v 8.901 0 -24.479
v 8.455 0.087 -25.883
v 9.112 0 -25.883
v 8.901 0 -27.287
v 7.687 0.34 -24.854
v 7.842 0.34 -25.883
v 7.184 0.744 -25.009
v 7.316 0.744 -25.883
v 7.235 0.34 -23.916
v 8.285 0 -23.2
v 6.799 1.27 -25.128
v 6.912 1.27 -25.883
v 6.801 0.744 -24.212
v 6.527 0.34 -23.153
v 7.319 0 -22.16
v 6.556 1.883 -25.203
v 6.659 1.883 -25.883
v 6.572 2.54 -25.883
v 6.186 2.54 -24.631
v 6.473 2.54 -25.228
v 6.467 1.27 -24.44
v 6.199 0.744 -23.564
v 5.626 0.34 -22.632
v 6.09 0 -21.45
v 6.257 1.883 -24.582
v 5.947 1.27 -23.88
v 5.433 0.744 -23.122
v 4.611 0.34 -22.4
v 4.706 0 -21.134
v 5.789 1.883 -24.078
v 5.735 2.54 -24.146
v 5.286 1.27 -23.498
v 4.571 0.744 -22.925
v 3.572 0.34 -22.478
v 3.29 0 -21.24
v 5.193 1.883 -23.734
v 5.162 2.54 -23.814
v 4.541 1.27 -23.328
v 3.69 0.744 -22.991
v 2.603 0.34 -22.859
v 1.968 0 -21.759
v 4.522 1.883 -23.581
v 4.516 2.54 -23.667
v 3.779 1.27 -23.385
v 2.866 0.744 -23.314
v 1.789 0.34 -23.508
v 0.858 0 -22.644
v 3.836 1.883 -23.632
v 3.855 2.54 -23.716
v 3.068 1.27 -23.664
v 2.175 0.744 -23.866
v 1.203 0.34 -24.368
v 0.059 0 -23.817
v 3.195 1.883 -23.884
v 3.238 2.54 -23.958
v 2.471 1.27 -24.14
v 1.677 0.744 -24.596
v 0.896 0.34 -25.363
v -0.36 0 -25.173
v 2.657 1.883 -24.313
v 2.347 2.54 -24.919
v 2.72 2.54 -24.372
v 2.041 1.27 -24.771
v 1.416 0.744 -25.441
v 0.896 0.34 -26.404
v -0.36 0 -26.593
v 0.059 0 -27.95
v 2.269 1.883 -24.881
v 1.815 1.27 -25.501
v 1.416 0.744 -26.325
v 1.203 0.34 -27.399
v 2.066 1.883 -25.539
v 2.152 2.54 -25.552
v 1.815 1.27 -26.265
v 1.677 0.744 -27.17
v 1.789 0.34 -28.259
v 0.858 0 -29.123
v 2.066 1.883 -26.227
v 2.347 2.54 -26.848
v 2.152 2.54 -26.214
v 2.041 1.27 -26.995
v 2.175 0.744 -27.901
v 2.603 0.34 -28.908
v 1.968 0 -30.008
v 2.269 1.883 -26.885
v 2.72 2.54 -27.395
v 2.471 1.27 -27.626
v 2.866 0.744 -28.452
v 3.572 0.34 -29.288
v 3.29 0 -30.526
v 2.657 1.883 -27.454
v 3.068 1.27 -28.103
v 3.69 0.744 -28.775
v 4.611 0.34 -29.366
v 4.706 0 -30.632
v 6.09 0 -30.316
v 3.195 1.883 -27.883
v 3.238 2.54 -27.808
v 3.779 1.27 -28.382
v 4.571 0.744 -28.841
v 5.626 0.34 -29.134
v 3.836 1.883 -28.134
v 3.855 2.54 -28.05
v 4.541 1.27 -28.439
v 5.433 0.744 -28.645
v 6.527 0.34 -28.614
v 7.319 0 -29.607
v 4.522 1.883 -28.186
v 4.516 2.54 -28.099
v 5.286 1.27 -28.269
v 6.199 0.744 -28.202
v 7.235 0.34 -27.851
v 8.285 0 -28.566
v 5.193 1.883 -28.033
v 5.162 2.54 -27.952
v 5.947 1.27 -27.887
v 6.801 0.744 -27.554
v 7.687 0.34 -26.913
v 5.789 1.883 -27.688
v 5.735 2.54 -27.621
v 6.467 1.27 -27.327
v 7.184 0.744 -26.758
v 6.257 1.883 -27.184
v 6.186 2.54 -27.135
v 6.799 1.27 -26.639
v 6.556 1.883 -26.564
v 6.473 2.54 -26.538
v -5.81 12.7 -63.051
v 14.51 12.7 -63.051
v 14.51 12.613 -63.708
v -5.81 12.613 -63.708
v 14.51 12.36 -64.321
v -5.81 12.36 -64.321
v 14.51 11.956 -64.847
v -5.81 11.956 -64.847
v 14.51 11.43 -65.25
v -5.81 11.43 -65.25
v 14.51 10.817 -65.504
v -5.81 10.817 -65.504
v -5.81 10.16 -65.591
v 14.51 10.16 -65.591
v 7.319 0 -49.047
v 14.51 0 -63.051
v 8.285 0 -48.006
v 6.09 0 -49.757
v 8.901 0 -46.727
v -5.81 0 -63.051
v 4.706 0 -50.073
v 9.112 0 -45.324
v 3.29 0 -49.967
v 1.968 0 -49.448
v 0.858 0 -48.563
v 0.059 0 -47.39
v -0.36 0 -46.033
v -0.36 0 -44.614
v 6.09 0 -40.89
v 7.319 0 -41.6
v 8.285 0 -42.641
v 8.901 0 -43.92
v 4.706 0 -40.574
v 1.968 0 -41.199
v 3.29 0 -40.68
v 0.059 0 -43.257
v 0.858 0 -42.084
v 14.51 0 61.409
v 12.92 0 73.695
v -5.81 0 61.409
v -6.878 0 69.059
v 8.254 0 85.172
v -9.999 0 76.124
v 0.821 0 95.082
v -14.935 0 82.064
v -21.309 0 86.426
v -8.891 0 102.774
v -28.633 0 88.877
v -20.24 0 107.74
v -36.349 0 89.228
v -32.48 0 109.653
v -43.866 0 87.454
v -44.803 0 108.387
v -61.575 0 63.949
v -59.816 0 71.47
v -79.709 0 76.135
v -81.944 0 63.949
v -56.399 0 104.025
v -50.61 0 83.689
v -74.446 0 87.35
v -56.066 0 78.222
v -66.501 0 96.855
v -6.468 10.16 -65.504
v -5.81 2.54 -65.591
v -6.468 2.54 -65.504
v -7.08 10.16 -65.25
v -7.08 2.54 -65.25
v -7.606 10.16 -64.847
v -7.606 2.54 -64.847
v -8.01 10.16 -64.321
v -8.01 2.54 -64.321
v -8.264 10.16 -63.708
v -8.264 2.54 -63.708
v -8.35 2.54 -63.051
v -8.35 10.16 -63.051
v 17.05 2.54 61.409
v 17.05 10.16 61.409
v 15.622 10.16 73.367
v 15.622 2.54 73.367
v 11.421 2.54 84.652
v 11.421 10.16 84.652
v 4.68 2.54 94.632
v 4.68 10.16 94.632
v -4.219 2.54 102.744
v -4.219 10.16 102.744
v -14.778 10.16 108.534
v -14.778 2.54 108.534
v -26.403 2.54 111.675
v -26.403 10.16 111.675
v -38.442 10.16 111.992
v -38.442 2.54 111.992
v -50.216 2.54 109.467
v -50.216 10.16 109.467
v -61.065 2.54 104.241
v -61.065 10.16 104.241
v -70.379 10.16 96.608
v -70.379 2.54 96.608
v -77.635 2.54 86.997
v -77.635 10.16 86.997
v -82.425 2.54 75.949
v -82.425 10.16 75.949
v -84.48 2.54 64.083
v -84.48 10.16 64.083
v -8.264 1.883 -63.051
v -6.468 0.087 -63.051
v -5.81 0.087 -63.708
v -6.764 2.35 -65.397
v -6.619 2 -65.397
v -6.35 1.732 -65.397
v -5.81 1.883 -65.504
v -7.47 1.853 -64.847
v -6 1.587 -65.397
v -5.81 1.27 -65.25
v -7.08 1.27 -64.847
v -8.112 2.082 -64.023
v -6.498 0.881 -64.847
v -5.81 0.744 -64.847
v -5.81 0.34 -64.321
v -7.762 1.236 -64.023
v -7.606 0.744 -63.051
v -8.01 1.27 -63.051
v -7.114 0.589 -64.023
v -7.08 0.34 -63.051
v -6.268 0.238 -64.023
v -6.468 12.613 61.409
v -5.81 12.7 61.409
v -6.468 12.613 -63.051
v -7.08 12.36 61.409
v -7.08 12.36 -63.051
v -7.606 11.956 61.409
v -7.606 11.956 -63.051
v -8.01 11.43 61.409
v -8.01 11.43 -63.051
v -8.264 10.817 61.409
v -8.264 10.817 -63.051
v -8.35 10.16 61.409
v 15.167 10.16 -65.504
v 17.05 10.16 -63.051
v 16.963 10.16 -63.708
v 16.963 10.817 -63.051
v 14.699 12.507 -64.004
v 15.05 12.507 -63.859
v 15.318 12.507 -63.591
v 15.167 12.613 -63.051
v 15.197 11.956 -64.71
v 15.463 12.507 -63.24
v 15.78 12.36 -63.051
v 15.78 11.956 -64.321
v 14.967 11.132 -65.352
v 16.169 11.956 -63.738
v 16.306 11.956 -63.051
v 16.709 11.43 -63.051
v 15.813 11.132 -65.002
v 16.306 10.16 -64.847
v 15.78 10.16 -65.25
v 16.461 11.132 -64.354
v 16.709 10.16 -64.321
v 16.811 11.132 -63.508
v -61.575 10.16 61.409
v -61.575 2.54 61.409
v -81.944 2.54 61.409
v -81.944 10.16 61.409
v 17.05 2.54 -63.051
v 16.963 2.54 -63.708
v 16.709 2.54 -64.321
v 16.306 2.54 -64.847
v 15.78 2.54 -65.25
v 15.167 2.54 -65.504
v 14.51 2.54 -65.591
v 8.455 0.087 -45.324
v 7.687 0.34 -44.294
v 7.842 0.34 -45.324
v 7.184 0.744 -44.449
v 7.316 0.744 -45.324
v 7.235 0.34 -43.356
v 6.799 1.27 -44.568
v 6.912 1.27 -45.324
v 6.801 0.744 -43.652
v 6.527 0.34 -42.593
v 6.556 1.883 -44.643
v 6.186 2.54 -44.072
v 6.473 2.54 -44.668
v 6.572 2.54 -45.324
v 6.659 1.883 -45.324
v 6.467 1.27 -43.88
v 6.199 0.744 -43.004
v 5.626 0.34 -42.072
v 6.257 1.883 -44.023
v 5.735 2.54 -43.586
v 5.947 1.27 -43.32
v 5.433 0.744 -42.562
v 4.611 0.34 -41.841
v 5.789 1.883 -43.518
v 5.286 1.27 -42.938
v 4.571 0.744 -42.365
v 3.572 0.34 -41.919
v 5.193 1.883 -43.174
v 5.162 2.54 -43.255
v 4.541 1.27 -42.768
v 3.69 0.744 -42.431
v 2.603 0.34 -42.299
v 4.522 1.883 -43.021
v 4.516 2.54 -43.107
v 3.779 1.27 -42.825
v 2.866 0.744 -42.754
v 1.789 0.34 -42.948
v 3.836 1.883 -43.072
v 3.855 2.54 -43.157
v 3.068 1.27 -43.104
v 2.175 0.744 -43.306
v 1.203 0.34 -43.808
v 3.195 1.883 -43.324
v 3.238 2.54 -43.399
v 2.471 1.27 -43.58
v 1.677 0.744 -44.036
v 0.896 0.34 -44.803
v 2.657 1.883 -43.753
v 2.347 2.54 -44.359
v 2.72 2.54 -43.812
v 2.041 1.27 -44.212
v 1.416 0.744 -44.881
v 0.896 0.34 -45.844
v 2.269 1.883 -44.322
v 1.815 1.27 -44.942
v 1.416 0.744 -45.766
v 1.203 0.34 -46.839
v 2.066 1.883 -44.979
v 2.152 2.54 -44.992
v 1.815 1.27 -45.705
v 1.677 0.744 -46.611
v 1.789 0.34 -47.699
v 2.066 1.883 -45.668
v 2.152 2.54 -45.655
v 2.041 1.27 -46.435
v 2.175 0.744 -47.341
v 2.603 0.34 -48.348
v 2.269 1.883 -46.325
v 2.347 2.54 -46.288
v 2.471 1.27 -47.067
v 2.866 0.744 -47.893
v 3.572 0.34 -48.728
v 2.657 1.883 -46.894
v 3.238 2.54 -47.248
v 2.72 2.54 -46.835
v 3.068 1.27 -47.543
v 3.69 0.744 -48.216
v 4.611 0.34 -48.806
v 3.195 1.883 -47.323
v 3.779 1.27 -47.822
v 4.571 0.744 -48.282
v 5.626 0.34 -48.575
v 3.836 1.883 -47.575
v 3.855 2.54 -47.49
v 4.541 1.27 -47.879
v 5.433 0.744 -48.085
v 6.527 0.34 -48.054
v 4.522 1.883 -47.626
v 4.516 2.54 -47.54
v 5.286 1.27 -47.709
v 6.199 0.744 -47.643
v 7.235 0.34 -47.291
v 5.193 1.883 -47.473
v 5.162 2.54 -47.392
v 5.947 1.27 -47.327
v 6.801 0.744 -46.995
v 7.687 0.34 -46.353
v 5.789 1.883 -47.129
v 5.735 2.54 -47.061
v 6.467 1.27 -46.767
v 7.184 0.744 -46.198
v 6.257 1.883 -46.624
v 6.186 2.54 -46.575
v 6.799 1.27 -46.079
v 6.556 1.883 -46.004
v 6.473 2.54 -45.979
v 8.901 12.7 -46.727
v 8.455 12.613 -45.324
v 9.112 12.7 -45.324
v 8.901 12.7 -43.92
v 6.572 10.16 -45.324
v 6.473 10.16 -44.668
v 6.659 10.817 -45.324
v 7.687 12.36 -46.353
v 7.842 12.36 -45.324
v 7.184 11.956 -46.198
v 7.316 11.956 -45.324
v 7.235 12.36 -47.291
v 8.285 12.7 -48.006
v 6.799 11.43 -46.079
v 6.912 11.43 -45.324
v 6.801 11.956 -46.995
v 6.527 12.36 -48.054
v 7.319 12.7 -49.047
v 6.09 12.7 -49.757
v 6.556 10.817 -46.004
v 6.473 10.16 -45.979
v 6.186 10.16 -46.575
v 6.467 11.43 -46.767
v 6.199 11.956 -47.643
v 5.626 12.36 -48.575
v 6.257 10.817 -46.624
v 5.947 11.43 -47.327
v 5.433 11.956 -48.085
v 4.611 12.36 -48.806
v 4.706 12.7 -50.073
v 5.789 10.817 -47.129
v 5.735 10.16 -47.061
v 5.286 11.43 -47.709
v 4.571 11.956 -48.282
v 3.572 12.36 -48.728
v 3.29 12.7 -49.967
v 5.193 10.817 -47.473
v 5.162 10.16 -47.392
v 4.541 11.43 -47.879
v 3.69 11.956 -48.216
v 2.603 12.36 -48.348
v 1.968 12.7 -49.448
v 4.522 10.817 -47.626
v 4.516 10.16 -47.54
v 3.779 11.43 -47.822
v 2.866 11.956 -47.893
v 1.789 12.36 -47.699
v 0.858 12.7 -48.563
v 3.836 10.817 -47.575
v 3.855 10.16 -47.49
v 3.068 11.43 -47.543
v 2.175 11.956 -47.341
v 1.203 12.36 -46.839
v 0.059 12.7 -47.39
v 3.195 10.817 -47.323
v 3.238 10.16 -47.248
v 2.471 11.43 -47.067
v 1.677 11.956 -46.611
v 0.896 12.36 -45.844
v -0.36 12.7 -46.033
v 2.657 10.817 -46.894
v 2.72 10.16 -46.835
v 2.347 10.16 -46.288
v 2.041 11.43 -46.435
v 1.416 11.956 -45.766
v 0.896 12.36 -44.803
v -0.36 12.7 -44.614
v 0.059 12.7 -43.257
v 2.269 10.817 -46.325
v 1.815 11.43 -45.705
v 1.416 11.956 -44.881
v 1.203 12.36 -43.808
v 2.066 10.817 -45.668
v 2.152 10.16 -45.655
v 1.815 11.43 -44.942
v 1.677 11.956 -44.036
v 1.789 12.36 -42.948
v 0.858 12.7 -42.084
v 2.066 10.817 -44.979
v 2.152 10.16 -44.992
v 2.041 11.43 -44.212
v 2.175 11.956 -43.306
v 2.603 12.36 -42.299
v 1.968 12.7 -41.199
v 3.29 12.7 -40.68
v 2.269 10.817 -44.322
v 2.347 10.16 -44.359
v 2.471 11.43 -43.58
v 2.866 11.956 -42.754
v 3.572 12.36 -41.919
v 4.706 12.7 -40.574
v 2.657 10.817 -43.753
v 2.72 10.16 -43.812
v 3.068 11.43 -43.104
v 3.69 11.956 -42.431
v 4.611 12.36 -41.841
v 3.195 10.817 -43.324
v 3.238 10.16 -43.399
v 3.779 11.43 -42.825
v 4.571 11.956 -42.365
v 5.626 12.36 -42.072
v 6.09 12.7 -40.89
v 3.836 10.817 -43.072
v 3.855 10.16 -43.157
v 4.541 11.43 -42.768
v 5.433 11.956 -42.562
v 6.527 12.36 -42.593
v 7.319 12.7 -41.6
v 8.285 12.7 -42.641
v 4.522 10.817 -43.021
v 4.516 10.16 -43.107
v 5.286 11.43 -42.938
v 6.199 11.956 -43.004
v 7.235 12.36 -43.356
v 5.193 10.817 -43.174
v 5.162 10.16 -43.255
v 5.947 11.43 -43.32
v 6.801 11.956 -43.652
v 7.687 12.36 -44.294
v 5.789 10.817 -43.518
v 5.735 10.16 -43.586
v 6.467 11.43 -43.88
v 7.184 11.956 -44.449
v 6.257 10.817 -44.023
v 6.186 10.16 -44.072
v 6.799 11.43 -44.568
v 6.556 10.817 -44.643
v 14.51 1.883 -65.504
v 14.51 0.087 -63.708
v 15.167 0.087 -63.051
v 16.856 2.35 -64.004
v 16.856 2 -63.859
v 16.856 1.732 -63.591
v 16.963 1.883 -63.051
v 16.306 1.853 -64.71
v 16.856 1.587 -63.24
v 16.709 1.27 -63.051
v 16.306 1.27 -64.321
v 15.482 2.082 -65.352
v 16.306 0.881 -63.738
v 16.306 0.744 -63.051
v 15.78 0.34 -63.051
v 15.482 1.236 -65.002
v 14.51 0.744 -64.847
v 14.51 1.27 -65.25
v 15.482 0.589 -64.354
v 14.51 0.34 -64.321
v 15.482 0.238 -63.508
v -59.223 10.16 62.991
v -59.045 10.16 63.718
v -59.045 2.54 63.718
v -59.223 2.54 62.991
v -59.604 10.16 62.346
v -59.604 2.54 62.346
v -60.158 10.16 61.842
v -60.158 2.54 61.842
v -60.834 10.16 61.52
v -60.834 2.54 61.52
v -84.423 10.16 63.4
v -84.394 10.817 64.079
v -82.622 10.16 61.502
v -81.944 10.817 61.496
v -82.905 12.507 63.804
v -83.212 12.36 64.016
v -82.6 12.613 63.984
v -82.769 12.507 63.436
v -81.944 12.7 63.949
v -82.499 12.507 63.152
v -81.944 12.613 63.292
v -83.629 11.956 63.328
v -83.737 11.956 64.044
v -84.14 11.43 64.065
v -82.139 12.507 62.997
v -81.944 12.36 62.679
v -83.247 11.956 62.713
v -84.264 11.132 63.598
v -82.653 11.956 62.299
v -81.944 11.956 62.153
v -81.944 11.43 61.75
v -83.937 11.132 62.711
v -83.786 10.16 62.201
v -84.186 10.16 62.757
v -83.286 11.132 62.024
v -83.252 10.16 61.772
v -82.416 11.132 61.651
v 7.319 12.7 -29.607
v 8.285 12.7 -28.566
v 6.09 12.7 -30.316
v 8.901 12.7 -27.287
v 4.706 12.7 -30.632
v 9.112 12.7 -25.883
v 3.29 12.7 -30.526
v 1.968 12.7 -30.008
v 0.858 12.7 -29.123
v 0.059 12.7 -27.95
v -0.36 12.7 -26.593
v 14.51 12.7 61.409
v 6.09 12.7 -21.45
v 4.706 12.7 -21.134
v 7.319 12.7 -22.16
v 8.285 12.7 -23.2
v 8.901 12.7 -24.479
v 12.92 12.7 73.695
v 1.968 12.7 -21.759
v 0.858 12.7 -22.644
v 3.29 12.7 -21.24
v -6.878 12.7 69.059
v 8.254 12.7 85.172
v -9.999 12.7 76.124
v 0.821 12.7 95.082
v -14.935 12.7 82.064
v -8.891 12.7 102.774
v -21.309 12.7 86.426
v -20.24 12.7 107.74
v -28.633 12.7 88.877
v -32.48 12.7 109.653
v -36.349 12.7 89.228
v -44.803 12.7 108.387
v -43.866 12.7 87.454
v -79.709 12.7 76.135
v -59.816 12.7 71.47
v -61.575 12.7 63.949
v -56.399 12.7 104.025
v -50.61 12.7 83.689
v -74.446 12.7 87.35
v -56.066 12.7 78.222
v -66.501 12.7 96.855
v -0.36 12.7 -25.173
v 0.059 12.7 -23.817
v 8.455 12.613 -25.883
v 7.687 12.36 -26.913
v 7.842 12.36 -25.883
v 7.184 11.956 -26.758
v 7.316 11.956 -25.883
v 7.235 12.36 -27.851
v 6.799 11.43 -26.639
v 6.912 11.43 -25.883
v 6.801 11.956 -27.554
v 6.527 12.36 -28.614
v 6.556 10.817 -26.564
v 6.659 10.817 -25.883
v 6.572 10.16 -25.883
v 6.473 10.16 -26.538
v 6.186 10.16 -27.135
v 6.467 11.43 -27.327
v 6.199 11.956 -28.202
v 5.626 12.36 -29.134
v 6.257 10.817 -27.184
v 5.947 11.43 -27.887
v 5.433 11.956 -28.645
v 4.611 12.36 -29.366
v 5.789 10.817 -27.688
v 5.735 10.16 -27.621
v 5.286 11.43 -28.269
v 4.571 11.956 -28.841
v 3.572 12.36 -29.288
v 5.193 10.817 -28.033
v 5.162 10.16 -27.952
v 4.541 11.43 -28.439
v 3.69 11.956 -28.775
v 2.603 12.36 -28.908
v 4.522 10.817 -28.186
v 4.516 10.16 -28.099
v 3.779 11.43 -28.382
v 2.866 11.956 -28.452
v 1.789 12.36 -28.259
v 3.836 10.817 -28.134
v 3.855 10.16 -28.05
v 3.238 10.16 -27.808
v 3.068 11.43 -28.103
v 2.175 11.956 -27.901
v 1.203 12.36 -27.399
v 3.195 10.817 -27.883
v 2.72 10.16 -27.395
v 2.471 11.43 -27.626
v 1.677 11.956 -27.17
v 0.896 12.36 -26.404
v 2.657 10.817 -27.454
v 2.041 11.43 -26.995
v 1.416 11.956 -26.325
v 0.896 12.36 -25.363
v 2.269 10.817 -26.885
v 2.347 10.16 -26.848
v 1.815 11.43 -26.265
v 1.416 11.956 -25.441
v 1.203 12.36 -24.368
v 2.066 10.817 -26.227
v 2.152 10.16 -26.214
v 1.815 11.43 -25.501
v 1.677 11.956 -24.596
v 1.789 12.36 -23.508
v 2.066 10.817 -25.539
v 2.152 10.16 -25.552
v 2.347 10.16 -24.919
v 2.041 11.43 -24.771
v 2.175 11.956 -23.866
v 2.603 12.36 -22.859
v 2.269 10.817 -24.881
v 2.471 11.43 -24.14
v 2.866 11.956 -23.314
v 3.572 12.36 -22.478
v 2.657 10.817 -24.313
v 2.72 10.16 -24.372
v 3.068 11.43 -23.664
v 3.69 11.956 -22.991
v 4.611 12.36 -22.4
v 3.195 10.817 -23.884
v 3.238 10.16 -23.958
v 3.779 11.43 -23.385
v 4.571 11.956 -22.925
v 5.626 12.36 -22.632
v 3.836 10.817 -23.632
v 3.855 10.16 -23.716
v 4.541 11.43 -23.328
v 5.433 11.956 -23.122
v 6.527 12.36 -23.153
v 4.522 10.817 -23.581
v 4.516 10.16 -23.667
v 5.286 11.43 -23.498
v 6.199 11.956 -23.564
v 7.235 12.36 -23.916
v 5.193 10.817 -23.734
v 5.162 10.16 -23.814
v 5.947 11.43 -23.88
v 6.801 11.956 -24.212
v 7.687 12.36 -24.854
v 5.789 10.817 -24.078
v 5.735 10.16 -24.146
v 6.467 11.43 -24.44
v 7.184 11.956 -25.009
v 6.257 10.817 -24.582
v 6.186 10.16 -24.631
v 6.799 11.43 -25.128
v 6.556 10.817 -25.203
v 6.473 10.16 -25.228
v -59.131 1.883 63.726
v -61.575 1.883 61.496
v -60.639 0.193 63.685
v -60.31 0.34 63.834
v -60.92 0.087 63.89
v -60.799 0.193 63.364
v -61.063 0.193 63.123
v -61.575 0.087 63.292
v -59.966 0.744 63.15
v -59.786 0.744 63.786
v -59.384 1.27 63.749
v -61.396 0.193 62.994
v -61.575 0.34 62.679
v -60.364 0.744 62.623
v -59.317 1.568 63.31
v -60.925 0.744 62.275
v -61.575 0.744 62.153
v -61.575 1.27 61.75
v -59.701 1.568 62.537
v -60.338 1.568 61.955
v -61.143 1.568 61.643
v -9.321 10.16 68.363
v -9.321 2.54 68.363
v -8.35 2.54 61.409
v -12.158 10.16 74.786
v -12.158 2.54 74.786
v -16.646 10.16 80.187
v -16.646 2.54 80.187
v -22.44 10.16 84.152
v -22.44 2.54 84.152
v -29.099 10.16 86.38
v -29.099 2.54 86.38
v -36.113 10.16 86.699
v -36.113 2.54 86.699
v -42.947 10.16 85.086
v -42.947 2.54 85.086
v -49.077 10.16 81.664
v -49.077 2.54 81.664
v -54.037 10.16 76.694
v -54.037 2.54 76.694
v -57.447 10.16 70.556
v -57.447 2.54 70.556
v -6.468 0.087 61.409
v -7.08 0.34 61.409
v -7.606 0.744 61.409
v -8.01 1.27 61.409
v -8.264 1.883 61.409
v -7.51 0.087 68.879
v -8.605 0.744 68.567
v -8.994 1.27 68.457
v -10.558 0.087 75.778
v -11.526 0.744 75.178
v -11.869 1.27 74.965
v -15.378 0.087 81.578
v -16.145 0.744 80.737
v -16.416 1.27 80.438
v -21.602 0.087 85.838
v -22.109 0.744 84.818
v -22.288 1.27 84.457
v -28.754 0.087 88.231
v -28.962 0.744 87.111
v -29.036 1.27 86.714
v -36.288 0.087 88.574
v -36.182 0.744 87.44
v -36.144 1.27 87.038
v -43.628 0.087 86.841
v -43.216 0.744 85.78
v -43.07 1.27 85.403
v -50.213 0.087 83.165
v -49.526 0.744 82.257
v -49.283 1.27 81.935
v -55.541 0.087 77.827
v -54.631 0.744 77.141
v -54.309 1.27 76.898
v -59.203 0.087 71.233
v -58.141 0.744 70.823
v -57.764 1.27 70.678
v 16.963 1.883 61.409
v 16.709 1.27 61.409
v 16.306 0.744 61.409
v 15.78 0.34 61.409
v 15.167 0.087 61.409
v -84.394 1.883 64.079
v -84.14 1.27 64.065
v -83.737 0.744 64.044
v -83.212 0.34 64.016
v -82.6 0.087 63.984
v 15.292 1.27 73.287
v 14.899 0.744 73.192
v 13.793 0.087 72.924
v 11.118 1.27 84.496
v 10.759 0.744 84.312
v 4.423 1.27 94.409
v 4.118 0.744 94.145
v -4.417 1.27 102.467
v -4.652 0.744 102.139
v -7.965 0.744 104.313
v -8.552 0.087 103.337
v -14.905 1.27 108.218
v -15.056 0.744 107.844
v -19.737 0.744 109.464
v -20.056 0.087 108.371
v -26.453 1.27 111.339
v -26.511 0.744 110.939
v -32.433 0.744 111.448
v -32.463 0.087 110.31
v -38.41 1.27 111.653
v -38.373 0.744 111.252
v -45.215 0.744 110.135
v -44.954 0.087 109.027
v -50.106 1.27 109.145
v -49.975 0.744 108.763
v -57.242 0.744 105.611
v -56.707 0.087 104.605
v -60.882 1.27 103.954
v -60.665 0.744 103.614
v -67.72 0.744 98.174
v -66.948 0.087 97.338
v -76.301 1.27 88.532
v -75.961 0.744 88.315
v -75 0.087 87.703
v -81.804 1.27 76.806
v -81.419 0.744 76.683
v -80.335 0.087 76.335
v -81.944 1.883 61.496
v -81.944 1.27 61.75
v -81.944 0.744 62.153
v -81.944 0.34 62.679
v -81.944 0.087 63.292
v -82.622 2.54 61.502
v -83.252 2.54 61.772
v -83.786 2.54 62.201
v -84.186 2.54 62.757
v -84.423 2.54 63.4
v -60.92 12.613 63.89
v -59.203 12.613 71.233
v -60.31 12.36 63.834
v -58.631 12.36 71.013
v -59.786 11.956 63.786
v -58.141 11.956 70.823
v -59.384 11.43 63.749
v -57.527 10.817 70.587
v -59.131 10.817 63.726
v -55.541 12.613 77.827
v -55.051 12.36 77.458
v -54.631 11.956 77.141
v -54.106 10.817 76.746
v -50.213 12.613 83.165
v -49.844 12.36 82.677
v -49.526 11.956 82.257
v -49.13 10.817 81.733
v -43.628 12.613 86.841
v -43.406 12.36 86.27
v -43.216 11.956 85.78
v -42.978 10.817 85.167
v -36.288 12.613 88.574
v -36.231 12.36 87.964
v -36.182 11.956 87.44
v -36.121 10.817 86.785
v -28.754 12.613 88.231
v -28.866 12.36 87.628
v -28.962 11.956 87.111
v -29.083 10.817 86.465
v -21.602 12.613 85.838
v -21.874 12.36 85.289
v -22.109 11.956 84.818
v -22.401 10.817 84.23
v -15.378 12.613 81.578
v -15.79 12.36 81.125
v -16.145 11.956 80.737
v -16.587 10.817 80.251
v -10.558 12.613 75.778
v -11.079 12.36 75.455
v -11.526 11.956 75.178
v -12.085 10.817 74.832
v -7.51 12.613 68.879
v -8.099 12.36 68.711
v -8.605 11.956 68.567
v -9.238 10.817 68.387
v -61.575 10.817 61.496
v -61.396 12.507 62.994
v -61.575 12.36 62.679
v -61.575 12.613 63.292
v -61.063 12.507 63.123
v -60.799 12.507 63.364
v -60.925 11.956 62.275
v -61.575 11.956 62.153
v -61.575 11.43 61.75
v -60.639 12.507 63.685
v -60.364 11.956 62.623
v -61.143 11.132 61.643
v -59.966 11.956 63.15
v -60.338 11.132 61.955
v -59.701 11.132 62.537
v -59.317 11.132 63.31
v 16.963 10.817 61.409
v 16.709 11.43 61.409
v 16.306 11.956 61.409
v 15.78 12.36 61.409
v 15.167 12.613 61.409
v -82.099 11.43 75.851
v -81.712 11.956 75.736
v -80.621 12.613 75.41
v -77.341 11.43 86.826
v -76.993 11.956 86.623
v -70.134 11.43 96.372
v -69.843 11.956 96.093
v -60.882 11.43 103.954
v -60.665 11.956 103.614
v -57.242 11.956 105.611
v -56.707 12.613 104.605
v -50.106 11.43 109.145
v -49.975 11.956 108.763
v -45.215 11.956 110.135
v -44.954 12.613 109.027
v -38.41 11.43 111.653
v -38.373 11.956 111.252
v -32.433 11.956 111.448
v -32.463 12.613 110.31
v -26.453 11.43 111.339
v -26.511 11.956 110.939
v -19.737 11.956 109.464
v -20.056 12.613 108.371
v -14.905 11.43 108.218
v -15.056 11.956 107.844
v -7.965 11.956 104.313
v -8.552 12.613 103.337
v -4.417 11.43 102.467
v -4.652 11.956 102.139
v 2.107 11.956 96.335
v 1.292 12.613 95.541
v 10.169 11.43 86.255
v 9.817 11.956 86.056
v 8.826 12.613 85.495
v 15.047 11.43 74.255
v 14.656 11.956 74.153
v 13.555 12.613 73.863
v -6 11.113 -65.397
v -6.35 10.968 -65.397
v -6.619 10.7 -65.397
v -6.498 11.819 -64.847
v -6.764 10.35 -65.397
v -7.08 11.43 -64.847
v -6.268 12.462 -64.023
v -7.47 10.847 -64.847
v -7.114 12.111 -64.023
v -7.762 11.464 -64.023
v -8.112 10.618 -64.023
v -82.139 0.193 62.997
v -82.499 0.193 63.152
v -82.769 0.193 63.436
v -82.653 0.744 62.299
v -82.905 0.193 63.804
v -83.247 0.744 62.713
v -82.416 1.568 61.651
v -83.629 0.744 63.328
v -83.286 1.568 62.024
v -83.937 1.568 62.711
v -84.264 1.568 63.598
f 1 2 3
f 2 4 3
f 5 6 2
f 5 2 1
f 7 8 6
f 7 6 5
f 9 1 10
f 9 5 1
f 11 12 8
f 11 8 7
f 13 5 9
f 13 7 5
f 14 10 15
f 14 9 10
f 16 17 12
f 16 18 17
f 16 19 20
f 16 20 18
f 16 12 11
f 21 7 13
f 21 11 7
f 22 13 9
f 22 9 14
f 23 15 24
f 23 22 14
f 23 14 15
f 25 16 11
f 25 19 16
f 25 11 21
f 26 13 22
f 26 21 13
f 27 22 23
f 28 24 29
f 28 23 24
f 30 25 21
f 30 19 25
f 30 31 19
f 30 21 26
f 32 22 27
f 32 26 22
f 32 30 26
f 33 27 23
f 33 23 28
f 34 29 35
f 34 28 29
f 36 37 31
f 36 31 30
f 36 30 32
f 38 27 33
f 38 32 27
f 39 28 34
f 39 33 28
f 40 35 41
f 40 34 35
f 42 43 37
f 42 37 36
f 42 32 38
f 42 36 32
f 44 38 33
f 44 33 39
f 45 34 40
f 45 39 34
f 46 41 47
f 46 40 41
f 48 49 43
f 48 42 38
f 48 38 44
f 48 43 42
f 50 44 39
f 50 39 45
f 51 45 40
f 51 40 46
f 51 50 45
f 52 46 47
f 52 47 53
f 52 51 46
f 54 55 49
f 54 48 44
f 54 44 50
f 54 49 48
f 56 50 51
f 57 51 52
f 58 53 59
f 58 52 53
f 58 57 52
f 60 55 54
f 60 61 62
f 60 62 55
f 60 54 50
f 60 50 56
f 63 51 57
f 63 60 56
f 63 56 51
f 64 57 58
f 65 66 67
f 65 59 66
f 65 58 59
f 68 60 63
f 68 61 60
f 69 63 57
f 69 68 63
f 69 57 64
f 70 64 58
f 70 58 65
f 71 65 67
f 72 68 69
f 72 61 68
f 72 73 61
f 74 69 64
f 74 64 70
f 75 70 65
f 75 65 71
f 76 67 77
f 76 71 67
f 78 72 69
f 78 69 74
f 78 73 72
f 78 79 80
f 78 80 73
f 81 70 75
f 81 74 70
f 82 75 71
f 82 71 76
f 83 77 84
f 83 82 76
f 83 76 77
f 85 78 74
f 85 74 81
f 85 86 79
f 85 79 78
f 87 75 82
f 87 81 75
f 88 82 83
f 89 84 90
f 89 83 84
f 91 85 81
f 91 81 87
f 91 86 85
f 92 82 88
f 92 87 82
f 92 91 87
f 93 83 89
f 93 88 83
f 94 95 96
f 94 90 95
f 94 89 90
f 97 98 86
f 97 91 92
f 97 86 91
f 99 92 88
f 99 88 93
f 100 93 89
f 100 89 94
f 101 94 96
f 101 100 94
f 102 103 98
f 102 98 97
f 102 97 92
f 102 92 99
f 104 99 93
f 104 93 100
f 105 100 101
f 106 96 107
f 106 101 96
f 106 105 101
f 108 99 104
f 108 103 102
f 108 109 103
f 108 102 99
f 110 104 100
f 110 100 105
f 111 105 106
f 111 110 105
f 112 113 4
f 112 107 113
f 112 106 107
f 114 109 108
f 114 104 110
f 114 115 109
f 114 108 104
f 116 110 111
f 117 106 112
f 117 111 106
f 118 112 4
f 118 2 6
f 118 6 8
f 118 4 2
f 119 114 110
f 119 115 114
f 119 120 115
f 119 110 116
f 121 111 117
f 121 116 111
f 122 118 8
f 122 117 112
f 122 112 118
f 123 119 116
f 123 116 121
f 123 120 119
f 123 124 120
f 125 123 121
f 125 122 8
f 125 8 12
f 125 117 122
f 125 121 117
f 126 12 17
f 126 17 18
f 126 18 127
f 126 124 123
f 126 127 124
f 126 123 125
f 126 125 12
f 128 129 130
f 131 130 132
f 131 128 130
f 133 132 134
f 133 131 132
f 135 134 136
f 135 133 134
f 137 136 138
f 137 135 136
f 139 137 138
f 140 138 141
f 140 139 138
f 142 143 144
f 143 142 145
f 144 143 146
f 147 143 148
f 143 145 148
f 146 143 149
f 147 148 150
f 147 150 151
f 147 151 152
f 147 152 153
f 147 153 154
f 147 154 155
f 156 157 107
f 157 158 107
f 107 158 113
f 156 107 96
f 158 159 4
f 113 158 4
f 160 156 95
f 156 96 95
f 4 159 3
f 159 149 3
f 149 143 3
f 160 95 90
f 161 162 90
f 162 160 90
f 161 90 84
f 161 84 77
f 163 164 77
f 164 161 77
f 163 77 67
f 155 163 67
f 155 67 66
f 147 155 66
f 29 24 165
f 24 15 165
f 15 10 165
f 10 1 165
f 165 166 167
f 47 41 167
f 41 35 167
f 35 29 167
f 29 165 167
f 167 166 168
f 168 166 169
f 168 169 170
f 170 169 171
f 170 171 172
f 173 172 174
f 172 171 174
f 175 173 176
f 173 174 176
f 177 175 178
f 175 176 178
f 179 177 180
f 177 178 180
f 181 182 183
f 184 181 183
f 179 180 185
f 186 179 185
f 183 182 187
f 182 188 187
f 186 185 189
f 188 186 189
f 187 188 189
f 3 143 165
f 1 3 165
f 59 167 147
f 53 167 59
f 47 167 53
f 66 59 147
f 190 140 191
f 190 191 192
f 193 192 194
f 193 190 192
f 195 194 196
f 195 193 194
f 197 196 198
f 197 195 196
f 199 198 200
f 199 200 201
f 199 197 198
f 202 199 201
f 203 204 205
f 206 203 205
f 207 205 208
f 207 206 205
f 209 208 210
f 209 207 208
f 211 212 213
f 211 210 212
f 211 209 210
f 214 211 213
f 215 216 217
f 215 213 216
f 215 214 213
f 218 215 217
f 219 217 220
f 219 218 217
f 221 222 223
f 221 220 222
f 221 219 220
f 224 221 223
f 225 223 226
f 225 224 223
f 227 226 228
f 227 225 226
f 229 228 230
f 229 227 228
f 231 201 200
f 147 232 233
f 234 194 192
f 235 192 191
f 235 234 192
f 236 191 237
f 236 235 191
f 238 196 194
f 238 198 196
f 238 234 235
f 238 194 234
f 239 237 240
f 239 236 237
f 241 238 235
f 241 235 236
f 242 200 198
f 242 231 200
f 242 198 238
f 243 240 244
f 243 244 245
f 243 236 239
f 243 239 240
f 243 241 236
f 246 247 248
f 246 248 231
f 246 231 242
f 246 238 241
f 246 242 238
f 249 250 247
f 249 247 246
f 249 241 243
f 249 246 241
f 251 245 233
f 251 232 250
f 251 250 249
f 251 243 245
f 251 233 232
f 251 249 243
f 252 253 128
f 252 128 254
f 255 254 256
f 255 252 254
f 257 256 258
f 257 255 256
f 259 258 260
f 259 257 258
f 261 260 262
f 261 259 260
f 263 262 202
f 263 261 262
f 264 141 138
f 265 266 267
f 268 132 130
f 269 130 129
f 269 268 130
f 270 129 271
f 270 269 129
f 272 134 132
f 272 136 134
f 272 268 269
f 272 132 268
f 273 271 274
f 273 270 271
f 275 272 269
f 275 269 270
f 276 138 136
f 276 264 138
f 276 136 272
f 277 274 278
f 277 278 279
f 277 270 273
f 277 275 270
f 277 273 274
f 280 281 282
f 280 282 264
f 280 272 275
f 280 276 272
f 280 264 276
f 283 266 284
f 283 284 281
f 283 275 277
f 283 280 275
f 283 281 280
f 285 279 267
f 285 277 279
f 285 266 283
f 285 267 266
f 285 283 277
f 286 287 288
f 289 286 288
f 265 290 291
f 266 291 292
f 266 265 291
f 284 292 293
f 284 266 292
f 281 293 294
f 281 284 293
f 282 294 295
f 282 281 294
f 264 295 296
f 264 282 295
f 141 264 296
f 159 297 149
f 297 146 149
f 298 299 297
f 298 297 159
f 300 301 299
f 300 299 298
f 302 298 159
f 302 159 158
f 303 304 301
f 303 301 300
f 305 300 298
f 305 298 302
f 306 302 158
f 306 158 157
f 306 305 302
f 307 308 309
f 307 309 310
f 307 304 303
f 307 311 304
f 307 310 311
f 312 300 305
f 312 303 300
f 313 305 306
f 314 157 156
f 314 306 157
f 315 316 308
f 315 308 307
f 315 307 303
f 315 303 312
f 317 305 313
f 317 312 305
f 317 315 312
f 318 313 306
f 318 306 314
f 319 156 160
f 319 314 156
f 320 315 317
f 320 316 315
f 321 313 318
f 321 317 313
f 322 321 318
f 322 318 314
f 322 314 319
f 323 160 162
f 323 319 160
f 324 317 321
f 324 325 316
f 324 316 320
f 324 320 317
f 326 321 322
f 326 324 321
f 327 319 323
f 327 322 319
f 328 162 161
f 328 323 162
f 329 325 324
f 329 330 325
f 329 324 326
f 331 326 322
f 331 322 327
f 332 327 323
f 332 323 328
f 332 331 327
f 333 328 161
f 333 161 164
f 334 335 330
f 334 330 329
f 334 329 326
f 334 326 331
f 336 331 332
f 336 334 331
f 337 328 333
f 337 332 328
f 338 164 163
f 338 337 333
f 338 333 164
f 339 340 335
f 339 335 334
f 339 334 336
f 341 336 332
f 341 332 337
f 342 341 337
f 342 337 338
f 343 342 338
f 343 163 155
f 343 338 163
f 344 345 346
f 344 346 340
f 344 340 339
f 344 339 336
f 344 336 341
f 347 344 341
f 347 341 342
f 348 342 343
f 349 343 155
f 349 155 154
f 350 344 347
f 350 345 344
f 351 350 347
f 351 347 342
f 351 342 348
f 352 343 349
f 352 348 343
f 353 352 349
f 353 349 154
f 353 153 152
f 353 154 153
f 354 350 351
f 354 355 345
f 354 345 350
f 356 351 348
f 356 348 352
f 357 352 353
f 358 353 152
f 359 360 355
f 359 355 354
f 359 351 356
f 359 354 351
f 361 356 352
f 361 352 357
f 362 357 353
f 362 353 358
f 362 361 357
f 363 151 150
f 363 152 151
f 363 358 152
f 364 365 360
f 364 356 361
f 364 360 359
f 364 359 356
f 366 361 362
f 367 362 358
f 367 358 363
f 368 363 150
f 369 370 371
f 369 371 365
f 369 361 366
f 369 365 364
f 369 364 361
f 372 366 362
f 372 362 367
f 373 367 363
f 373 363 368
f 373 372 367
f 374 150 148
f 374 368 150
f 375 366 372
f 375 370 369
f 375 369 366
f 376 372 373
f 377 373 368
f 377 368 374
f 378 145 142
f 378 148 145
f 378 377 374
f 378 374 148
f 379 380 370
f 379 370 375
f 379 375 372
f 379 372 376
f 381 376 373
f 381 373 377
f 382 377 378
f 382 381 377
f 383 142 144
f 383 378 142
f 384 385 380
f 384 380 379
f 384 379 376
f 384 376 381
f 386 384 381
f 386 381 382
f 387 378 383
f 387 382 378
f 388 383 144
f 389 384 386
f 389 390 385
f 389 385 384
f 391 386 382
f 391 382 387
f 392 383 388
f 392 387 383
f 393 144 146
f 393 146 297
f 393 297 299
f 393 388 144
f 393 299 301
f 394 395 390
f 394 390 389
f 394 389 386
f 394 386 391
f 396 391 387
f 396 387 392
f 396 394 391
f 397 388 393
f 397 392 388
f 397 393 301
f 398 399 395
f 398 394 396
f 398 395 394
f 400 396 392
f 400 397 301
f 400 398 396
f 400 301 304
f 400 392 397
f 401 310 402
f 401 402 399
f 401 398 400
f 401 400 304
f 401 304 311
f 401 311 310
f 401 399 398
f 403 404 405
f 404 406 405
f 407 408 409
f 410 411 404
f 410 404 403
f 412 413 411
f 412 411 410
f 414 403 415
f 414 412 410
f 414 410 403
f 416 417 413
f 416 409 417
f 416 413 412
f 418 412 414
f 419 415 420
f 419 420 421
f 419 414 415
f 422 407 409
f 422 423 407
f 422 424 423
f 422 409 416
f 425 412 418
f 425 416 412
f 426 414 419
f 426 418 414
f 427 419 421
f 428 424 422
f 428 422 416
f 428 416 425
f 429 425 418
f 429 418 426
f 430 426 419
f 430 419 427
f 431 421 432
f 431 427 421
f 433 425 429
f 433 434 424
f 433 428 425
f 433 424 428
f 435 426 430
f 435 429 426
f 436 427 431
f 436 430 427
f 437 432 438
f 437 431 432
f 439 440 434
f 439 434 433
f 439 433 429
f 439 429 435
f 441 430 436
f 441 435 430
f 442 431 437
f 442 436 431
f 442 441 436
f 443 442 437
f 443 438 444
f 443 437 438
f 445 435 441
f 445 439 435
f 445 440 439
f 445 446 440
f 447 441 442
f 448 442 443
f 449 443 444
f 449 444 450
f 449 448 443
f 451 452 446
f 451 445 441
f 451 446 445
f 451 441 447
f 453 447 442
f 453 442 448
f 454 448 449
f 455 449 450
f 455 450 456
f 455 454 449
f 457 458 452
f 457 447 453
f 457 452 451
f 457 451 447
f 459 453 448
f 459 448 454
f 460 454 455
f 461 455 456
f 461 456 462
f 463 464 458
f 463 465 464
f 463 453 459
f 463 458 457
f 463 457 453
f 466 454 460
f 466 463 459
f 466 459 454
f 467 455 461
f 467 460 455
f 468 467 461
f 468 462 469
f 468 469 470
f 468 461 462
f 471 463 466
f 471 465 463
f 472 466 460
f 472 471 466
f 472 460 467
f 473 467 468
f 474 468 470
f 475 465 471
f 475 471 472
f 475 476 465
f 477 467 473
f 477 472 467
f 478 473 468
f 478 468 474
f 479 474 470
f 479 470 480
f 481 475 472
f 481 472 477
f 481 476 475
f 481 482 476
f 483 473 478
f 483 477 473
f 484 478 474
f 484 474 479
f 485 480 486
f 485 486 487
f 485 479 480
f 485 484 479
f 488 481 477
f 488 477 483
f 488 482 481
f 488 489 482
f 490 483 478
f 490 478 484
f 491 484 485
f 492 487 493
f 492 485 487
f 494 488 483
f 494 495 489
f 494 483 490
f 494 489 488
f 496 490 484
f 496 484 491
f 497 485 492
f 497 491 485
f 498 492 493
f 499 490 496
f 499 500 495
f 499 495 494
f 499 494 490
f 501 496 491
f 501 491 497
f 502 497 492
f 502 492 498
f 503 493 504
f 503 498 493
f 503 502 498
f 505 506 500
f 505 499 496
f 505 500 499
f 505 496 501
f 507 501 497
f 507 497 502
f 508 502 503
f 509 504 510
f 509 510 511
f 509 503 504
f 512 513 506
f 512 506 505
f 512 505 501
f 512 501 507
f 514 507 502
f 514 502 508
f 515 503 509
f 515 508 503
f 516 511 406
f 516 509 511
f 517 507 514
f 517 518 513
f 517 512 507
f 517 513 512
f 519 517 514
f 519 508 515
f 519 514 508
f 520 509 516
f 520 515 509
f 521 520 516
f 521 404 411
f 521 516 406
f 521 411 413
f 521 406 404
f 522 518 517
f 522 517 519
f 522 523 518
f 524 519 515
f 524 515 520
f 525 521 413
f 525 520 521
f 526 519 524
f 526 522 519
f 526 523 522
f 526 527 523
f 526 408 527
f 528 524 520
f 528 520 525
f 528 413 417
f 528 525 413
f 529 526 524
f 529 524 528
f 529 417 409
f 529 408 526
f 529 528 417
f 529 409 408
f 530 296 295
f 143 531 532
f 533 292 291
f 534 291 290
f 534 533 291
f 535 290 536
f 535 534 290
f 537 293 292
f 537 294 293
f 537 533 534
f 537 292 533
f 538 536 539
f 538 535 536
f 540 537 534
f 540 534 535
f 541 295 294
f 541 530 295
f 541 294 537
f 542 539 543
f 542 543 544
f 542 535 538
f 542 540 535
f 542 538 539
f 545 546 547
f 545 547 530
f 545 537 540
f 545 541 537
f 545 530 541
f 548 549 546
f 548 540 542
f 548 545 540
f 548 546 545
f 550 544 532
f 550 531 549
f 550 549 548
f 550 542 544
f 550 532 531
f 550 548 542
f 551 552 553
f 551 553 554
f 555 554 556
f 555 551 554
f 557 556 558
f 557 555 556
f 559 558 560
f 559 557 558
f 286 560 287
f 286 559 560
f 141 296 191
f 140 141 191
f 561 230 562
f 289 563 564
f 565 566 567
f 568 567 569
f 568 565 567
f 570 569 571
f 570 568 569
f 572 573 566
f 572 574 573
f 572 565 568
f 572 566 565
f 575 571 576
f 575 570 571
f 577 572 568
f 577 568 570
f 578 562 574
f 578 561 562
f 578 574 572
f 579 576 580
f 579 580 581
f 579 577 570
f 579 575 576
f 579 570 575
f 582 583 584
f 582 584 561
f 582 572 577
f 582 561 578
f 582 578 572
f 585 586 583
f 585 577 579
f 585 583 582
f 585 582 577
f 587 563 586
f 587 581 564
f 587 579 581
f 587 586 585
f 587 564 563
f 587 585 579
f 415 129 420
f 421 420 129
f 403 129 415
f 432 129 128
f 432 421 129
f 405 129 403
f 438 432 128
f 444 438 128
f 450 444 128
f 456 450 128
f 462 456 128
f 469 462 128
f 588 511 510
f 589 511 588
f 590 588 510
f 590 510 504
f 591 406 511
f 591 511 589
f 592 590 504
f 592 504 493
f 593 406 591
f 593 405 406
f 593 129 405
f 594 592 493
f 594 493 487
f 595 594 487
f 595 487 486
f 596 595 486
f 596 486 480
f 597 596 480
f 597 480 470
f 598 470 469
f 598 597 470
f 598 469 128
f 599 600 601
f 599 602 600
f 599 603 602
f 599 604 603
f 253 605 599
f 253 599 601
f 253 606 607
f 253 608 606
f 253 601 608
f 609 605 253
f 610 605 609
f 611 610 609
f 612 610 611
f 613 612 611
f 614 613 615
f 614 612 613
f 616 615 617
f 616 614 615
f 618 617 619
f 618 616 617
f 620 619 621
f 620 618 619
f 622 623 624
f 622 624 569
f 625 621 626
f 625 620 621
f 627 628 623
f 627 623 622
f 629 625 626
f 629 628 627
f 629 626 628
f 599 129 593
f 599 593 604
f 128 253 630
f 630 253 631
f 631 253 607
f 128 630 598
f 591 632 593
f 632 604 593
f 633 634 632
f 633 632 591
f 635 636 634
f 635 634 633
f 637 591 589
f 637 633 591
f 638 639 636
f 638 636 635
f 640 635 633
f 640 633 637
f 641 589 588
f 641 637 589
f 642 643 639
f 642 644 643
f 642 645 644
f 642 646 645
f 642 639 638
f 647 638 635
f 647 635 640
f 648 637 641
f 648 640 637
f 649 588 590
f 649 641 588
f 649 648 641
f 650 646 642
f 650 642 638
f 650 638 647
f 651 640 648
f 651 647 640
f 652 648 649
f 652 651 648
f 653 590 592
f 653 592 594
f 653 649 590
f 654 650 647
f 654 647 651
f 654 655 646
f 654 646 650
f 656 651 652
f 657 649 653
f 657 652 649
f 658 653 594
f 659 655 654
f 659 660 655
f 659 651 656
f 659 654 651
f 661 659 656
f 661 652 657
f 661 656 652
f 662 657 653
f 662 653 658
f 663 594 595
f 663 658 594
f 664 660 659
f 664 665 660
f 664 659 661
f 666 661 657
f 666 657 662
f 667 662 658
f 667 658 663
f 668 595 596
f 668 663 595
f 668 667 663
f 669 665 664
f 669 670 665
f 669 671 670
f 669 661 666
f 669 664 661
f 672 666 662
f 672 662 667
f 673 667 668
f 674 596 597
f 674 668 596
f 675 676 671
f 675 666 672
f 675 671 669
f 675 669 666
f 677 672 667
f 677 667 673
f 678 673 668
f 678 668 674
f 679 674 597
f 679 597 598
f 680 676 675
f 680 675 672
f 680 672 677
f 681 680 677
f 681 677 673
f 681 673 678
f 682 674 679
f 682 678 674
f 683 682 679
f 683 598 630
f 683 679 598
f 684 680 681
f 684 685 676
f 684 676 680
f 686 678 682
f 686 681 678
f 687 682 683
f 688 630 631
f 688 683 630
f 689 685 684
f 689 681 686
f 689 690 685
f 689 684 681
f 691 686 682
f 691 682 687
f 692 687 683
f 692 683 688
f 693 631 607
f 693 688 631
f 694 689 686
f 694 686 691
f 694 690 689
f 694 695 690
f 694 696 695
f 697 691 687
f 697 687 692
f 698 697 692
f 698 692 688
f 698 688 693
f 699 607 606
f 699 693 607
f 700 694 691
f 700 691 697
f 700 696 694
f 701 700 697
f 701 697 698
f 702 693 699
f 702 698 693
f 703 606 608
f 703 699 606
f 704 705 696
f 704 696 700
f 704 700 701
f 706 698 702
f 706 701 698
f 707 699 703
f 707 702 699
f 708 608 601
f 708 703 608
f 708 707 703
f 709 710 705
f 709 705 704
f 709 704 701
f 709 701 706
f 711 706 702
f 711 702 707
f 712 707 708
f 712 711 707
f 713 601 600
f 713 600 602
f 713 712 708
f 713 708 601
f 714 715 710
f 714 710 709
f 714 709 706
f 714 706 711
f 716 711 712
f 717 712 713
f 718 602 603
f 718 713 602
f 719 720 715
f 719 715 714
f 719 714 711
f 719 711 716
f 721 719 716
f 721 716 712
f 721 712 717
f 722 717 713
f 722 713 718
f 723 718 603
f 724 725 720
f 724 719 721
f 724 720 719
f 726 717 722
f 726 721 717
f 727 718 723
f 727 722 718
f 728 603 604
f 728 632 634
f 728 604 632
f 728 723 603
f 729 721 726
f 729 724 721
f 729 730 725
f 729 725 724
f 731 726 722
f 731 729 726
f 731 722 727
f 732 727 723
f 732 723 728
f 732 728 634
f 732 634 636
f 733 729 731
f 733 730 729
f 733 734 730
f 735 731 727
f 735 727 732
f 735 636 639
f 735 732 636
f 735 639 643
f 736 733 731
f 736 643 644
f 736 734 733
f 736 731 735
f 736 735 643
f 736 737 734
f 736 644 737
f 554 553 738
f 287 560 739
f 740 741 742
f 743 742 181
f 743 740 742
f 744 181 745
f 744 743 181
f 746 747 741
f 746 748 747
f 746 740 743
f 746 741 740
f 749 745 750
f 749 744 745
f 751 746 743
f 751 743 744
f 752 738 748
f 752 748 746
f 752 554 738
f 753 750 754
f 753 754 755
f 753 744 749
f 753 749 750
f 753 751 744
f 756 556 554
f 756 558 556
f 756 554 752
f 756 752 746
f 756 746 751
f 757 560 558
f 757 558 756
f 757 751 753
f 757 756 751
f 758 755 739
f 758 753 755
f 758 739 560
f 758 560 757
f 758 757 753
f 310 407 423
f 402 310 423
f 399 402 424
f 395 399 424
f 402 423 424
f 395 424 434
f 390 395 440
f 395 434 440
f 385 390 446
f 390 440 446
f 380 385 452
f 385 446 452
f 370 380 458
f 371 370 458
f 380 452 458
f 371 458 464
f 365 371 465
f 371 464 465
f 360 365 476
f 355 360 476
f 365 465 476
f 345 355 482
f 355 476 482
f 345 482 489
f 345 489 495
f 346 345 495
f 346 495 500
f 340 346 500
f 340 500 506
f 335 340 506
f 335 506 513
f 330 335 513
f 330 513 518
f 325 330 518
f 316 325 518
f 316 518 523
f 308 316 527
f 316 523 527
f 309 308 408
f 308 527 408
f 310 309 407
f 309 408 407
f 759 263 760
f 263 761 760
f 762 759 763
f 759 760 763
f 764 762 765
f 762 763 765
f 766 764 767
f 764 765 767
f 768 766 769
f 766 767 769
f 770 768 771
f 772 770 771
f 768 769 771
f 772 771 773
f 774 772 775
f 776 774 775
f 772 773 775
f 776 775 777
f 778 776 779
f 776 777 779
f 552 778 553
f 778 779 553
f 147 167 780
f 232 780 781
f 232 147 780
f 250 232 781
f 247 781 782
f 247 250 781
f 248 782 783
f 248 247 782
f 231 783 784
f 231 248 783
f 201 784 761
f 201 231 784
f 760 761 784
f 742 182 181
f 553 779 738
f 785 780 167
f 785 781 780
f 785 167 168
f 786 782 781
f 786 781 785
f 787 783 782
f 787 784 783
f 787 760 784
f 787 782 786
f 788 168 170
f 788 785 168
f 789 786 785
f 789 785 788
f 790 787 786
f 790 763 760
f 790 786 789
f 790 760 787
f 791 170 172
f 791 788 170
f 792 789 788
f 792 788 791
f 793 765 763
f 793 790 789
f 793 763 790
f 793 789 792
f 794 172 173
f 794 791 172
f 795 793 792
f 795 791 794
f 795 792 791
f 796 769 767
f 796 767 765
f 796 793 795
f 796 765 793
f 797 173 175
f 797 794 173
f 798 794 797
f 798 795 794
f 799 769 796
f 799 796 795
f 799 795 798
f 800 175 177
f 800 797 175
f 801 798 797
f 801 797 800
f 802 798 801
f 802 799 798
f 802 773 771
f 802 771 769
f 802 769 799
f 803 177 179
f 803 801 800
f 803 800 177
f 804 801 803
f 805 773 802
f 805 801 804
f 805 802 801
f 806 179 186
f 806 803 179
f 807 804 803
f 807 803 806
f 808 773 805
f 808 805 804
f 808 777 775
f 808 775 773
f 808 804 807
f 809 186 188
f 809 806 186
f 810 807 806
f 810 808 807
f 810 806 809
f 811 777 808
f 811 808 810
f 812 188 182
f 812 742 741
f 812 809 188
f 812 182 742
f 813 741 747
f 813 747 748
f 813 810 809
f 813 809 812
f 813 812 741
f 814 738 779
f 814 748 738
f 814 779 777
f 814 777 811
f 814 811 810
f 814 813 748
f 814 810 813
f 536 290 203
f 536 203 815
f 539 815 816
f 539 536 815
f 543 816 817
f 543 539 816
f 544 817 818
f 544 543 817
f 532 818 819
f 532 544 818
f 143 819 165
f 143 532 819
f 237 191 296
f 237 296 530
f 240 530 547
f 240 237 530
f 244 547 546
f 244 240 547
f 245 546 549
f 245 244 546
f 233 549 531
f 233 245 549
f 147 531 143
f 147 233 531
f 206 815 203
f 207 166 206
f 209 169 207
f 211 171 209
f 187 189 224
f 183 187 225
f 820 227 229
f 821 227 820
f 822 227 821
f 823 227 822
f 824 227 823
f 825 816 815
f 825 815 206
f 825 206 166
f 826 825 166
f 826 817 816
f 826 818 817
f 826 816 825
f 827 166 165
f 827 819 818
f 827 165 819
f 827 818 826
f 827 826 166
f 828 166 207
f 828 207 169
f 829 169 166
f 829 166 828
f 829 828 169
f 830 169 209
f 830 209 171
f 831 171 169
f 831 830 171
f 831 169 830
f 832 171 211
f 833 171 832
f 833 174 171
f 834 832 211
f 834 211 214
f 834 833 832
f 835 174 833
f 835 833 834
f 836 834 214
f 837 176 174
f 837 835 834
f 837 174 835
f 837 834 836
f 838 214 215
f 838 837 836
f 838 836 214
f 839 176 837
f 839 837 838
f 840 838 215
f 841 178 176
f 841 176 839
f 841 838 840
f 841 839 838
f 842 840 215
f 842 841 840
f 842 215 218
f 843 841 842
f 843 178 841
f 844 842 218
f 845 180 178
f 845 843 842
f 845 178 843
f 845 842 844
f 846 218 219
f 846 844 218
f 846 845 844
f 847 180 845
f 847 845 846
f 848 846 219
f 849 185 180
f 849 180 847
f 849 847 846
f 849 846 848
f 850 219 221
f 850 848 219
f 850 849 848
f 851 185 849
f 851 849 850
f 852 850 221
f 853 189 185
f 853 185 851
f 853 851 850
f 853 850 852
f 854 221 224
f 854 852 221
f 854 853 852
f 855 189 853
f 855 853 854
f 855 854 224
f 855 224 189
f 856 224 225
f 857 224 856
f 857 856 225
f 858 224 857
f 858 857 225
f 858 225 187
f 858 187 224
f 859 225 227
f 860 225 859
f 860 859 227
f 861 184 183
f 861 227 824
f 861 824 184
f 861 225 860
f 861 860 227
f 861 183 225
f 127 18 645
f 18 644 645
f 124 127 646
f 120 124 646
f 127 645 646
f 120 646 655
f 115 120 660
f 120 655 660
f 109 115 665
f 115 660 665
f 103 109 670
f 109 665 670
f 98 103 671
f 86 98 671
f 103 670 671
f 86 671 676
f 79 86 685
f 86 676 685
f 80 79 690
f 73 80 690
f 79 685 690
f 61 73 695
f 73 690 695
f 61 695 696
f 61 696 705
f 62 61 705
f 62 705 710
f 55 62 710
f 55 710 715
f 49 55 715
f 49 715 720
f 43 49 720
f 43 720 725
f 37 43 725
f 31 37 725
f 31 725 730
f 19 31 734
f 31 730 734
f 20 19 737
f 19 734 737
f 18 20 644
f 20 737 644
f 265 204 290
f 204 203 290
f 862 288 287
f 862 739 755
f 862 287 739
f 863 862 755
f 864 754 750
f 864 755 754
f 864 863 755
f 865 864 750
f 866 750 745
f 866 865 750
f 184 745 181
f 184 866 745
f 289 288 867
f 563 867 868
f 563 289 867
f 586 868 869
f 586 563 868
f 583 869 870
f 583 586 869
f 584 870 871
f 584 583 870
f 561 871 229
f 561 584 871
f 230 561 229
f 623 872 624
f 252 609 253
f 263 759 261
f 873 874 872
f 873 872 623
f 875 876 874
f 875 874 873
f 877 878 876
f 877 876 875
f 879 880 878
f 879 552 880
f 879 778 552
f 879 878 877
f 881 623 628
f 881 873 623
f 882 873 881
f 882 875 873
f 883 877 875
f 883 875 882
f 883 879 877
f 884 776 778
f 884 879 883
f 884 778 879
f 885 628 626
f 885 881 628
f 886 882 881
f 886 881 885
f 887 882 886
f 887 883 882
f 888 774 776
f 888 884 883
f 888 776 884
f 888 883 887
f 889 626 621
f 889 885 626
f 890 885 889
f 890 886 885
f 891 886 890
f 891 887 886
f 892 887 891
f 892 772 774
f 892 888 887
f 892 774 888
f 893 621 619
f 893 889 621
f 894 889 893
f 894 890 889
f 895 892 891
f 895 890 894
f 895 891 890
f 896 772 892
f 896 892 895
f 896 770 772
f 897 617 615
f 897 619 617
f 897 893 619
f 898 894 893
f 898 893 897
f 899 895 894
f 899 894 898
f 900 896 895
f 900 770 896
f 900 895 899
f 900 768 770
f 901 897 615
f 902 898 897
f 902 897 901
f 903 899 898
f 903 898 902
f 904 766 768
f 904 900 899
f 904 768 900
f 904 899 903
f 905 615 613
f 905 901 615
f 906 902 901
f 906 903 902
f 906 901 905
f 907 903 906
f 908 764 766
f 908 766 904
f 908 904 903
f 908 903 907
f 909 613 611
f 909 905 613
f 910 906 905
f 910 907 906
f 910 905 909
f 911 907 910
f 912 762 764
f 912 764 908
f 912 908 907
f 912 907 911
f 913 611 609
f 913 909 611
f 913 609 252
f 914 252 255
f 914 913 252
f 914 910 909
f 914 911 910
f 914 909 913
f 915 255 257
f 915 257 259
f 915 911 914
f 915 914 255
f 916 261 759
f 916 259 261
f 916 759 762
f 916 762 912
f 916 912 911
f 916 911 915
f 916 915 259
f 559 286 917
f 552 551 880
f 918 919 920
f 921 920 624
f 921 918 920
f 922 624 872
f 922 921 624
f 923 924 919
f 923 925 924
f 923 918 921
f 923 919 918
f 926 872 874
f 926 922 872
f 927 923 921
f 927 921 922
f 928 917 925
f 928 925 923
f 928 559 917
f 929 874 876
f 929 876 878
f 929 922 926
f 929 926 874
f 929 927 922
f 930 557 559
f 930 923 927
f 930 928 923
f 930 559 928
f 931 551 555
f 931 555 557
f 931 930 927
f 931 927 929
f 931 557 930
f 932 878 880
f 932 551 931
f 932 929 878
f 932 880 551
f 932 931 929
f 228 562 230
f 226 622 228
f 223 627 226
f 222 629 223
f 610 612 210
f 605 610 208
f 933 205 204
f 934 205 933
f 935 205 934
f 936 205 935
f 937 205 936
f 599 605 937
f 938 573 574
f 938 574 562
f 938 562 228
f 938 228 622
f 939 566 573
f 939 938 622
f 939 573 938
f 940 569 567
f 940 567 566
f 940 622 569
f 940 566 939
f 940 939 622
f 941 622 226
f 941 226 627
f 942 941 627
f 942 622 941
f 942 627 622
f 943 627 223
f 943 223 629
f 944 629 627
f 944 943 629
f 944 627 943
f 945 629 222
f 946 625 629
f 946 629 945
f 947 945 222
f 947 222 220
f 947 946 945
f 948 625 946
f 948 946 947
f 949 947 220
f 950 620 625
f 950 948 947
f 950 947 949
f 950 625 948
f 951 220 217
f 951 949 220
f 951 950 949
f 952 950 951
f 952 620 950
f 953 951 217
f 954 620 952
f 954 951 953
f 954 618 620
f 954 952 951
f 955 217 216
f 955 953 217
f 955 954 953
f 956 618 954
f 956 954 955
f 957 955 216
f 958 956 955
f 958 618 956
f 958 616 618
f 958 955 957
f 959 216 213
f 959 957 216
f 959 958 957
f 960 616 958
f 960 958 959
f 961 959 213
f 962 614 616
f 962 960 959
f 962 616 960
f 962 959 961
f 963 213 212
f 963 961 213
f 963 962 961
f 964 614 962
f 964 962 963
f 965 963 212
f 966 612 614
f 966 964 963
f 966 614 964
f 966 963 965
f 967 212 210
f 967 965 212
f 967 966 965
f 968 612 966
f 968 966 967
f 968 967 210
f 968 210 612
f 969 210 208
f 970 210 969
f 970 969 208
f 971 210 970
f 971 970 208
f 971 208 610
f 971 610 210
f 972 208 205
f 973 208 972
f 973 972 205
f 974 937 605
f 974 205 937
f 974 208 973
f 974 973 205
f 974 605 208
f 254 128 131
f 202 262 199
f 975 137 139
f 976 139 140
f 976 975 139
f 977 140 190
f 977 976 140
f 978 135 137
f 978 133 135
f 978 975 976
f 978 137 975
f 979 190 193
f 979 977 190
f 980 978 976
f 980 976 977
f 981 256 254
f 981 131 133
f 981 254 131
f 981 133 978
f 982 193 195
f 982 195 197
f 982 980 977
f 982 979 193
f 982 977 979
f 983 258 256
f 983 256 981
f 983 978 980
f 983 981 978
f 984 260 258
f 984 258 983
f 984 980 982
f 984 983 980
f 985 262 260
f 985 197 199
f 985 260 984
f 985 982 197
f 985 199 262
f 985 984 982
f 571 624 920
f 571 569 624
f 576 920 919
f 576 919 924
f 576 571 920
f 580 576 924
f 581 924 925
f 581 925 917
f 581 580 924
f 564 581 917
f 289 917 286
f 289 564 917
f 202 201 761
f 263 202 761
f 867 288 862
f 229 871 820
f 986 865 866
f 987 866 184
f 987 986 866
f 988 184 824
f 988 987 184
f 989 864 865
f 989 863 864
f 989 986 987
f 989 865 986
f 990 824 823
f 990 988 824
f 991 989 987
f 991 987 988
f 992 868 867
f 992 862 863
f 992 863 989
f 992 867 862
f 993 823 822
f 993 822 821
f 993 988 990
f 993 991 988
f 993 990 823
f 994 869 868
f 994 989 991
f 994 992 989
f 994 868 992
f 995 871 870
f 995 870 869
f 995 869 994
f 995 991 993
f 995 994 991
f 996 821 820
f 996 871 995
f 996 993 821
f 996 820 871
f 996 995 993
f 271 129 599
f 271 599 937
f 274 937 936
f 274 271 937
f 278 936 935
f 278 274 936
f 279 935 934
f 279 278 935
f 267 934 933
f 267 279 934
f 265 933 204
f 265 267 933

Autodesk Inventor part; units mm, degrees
ref_plane "YZ Plane" through (0, 0, 0) normal (1, 0, 0) x (0, 1, 0)
ref_plane "XZ Plane" through (0, 0, 0) normal (0, 1, 0) x (-1, 0, 0)
ref_plane "XY Plane" through (0, 0, 0) normal (0, 0, 1) x (1, 0, 0)
sketch "Sketch1" plane through (0, 0, 0) normal (0, 1, 0) x (-1, 0, 0)
  line L0 (-17.0496, -65.5906) -> (8.3504, -65.5906)
  line L1 (8.3504, -65.5906) -> (8.3504, 61.4094)
  line L2 (8.3504, 61.4094) -> (-17.0496, 61.4094)
  line L3 (-17.0496, 61.4094) -> (-17.0496, -65.5906)
  arc A0 (84.5504, 61.4094) -> (-17.0496, 61.4094) centre (33.7504, 61.4094) ccw
  arc A1 (59.1504, 61.4094) -> (8.3504, 61.4094) centre (33.7504, 61.4094) ccw
  line L4 (59.1504, 61.4094) -> (84.5504, 61.4094)
  point P0 (0, 0)
  dimension "d0" = 25.4
  dimension "d1" = 127
  dimension "d4" = 25.4
extrude "Extrusion1" add sketch "Sketch1" along normal blind 12.7
sketch "Sketch2" plane through (0, 12.7, 0) normal (0, 1, 0) x (1, 0, 0)
  line L0 (17.0496, -61.4094) -> (17.0496, 65.5906) projected
  line L1 (-8.3504, 65.5906) -> (-8.3504, -61.4094) projected
  circle A0 centre (4.3496, 45.3235) radius 2.2225
  circle A1 centre (4.3496, 25.8832) radius 2.2225
  line L2 (17.0496, 65.5906) -> (-8.3504, 0) construction
  line L3 (-8.3504, 65.5906) -> (17.0496, 0) construction
  line L4 (4.3496, 64.9234) -> (4.3496, 23.5933) construction
  point P0 (0, 0)
  point P1 (4.3496, 32.7953)
  dimension "d6" = 4.445
  dimension "d9" = 19.4403
extrude "Extrusion2" cut sketch "Sketch2" against normal through all
fillet "Fillet2" radius 2.54 20 edges at (-33.7504, 0, 86.8094) (-8.3504, 0, -2.0906) (4.3496, 0, -65.5906) (17.0496, 0, -2.0906) (-33.7504, 0, 112.2094) (-71.8504, 0, 61.4094) (17.0496, 6.35, -65.5906) (17.0496, 12.7, -2.0906) (-8.3504, 12.7, -2.0906) (-8.3504, 6.35, -65.5906) (4.3496, 12.7, -65.5906) (-33.7504, 12.7, 112.2094) (-84.5504, 6.35, 61.4094) (-71.8504, 12.7, 61.4094) (-59.1504, 6.35, 61.4094) (-33.7504, 12.7, 86.8094) (2.1271, 12.7, -25.8832) (2.1271, 0, -25.8832) (2.1271, 12.7, -45.3235) (2.1271, 0, -45.3235)
properties part number "hook" material "Polycarbonate, Clear"
